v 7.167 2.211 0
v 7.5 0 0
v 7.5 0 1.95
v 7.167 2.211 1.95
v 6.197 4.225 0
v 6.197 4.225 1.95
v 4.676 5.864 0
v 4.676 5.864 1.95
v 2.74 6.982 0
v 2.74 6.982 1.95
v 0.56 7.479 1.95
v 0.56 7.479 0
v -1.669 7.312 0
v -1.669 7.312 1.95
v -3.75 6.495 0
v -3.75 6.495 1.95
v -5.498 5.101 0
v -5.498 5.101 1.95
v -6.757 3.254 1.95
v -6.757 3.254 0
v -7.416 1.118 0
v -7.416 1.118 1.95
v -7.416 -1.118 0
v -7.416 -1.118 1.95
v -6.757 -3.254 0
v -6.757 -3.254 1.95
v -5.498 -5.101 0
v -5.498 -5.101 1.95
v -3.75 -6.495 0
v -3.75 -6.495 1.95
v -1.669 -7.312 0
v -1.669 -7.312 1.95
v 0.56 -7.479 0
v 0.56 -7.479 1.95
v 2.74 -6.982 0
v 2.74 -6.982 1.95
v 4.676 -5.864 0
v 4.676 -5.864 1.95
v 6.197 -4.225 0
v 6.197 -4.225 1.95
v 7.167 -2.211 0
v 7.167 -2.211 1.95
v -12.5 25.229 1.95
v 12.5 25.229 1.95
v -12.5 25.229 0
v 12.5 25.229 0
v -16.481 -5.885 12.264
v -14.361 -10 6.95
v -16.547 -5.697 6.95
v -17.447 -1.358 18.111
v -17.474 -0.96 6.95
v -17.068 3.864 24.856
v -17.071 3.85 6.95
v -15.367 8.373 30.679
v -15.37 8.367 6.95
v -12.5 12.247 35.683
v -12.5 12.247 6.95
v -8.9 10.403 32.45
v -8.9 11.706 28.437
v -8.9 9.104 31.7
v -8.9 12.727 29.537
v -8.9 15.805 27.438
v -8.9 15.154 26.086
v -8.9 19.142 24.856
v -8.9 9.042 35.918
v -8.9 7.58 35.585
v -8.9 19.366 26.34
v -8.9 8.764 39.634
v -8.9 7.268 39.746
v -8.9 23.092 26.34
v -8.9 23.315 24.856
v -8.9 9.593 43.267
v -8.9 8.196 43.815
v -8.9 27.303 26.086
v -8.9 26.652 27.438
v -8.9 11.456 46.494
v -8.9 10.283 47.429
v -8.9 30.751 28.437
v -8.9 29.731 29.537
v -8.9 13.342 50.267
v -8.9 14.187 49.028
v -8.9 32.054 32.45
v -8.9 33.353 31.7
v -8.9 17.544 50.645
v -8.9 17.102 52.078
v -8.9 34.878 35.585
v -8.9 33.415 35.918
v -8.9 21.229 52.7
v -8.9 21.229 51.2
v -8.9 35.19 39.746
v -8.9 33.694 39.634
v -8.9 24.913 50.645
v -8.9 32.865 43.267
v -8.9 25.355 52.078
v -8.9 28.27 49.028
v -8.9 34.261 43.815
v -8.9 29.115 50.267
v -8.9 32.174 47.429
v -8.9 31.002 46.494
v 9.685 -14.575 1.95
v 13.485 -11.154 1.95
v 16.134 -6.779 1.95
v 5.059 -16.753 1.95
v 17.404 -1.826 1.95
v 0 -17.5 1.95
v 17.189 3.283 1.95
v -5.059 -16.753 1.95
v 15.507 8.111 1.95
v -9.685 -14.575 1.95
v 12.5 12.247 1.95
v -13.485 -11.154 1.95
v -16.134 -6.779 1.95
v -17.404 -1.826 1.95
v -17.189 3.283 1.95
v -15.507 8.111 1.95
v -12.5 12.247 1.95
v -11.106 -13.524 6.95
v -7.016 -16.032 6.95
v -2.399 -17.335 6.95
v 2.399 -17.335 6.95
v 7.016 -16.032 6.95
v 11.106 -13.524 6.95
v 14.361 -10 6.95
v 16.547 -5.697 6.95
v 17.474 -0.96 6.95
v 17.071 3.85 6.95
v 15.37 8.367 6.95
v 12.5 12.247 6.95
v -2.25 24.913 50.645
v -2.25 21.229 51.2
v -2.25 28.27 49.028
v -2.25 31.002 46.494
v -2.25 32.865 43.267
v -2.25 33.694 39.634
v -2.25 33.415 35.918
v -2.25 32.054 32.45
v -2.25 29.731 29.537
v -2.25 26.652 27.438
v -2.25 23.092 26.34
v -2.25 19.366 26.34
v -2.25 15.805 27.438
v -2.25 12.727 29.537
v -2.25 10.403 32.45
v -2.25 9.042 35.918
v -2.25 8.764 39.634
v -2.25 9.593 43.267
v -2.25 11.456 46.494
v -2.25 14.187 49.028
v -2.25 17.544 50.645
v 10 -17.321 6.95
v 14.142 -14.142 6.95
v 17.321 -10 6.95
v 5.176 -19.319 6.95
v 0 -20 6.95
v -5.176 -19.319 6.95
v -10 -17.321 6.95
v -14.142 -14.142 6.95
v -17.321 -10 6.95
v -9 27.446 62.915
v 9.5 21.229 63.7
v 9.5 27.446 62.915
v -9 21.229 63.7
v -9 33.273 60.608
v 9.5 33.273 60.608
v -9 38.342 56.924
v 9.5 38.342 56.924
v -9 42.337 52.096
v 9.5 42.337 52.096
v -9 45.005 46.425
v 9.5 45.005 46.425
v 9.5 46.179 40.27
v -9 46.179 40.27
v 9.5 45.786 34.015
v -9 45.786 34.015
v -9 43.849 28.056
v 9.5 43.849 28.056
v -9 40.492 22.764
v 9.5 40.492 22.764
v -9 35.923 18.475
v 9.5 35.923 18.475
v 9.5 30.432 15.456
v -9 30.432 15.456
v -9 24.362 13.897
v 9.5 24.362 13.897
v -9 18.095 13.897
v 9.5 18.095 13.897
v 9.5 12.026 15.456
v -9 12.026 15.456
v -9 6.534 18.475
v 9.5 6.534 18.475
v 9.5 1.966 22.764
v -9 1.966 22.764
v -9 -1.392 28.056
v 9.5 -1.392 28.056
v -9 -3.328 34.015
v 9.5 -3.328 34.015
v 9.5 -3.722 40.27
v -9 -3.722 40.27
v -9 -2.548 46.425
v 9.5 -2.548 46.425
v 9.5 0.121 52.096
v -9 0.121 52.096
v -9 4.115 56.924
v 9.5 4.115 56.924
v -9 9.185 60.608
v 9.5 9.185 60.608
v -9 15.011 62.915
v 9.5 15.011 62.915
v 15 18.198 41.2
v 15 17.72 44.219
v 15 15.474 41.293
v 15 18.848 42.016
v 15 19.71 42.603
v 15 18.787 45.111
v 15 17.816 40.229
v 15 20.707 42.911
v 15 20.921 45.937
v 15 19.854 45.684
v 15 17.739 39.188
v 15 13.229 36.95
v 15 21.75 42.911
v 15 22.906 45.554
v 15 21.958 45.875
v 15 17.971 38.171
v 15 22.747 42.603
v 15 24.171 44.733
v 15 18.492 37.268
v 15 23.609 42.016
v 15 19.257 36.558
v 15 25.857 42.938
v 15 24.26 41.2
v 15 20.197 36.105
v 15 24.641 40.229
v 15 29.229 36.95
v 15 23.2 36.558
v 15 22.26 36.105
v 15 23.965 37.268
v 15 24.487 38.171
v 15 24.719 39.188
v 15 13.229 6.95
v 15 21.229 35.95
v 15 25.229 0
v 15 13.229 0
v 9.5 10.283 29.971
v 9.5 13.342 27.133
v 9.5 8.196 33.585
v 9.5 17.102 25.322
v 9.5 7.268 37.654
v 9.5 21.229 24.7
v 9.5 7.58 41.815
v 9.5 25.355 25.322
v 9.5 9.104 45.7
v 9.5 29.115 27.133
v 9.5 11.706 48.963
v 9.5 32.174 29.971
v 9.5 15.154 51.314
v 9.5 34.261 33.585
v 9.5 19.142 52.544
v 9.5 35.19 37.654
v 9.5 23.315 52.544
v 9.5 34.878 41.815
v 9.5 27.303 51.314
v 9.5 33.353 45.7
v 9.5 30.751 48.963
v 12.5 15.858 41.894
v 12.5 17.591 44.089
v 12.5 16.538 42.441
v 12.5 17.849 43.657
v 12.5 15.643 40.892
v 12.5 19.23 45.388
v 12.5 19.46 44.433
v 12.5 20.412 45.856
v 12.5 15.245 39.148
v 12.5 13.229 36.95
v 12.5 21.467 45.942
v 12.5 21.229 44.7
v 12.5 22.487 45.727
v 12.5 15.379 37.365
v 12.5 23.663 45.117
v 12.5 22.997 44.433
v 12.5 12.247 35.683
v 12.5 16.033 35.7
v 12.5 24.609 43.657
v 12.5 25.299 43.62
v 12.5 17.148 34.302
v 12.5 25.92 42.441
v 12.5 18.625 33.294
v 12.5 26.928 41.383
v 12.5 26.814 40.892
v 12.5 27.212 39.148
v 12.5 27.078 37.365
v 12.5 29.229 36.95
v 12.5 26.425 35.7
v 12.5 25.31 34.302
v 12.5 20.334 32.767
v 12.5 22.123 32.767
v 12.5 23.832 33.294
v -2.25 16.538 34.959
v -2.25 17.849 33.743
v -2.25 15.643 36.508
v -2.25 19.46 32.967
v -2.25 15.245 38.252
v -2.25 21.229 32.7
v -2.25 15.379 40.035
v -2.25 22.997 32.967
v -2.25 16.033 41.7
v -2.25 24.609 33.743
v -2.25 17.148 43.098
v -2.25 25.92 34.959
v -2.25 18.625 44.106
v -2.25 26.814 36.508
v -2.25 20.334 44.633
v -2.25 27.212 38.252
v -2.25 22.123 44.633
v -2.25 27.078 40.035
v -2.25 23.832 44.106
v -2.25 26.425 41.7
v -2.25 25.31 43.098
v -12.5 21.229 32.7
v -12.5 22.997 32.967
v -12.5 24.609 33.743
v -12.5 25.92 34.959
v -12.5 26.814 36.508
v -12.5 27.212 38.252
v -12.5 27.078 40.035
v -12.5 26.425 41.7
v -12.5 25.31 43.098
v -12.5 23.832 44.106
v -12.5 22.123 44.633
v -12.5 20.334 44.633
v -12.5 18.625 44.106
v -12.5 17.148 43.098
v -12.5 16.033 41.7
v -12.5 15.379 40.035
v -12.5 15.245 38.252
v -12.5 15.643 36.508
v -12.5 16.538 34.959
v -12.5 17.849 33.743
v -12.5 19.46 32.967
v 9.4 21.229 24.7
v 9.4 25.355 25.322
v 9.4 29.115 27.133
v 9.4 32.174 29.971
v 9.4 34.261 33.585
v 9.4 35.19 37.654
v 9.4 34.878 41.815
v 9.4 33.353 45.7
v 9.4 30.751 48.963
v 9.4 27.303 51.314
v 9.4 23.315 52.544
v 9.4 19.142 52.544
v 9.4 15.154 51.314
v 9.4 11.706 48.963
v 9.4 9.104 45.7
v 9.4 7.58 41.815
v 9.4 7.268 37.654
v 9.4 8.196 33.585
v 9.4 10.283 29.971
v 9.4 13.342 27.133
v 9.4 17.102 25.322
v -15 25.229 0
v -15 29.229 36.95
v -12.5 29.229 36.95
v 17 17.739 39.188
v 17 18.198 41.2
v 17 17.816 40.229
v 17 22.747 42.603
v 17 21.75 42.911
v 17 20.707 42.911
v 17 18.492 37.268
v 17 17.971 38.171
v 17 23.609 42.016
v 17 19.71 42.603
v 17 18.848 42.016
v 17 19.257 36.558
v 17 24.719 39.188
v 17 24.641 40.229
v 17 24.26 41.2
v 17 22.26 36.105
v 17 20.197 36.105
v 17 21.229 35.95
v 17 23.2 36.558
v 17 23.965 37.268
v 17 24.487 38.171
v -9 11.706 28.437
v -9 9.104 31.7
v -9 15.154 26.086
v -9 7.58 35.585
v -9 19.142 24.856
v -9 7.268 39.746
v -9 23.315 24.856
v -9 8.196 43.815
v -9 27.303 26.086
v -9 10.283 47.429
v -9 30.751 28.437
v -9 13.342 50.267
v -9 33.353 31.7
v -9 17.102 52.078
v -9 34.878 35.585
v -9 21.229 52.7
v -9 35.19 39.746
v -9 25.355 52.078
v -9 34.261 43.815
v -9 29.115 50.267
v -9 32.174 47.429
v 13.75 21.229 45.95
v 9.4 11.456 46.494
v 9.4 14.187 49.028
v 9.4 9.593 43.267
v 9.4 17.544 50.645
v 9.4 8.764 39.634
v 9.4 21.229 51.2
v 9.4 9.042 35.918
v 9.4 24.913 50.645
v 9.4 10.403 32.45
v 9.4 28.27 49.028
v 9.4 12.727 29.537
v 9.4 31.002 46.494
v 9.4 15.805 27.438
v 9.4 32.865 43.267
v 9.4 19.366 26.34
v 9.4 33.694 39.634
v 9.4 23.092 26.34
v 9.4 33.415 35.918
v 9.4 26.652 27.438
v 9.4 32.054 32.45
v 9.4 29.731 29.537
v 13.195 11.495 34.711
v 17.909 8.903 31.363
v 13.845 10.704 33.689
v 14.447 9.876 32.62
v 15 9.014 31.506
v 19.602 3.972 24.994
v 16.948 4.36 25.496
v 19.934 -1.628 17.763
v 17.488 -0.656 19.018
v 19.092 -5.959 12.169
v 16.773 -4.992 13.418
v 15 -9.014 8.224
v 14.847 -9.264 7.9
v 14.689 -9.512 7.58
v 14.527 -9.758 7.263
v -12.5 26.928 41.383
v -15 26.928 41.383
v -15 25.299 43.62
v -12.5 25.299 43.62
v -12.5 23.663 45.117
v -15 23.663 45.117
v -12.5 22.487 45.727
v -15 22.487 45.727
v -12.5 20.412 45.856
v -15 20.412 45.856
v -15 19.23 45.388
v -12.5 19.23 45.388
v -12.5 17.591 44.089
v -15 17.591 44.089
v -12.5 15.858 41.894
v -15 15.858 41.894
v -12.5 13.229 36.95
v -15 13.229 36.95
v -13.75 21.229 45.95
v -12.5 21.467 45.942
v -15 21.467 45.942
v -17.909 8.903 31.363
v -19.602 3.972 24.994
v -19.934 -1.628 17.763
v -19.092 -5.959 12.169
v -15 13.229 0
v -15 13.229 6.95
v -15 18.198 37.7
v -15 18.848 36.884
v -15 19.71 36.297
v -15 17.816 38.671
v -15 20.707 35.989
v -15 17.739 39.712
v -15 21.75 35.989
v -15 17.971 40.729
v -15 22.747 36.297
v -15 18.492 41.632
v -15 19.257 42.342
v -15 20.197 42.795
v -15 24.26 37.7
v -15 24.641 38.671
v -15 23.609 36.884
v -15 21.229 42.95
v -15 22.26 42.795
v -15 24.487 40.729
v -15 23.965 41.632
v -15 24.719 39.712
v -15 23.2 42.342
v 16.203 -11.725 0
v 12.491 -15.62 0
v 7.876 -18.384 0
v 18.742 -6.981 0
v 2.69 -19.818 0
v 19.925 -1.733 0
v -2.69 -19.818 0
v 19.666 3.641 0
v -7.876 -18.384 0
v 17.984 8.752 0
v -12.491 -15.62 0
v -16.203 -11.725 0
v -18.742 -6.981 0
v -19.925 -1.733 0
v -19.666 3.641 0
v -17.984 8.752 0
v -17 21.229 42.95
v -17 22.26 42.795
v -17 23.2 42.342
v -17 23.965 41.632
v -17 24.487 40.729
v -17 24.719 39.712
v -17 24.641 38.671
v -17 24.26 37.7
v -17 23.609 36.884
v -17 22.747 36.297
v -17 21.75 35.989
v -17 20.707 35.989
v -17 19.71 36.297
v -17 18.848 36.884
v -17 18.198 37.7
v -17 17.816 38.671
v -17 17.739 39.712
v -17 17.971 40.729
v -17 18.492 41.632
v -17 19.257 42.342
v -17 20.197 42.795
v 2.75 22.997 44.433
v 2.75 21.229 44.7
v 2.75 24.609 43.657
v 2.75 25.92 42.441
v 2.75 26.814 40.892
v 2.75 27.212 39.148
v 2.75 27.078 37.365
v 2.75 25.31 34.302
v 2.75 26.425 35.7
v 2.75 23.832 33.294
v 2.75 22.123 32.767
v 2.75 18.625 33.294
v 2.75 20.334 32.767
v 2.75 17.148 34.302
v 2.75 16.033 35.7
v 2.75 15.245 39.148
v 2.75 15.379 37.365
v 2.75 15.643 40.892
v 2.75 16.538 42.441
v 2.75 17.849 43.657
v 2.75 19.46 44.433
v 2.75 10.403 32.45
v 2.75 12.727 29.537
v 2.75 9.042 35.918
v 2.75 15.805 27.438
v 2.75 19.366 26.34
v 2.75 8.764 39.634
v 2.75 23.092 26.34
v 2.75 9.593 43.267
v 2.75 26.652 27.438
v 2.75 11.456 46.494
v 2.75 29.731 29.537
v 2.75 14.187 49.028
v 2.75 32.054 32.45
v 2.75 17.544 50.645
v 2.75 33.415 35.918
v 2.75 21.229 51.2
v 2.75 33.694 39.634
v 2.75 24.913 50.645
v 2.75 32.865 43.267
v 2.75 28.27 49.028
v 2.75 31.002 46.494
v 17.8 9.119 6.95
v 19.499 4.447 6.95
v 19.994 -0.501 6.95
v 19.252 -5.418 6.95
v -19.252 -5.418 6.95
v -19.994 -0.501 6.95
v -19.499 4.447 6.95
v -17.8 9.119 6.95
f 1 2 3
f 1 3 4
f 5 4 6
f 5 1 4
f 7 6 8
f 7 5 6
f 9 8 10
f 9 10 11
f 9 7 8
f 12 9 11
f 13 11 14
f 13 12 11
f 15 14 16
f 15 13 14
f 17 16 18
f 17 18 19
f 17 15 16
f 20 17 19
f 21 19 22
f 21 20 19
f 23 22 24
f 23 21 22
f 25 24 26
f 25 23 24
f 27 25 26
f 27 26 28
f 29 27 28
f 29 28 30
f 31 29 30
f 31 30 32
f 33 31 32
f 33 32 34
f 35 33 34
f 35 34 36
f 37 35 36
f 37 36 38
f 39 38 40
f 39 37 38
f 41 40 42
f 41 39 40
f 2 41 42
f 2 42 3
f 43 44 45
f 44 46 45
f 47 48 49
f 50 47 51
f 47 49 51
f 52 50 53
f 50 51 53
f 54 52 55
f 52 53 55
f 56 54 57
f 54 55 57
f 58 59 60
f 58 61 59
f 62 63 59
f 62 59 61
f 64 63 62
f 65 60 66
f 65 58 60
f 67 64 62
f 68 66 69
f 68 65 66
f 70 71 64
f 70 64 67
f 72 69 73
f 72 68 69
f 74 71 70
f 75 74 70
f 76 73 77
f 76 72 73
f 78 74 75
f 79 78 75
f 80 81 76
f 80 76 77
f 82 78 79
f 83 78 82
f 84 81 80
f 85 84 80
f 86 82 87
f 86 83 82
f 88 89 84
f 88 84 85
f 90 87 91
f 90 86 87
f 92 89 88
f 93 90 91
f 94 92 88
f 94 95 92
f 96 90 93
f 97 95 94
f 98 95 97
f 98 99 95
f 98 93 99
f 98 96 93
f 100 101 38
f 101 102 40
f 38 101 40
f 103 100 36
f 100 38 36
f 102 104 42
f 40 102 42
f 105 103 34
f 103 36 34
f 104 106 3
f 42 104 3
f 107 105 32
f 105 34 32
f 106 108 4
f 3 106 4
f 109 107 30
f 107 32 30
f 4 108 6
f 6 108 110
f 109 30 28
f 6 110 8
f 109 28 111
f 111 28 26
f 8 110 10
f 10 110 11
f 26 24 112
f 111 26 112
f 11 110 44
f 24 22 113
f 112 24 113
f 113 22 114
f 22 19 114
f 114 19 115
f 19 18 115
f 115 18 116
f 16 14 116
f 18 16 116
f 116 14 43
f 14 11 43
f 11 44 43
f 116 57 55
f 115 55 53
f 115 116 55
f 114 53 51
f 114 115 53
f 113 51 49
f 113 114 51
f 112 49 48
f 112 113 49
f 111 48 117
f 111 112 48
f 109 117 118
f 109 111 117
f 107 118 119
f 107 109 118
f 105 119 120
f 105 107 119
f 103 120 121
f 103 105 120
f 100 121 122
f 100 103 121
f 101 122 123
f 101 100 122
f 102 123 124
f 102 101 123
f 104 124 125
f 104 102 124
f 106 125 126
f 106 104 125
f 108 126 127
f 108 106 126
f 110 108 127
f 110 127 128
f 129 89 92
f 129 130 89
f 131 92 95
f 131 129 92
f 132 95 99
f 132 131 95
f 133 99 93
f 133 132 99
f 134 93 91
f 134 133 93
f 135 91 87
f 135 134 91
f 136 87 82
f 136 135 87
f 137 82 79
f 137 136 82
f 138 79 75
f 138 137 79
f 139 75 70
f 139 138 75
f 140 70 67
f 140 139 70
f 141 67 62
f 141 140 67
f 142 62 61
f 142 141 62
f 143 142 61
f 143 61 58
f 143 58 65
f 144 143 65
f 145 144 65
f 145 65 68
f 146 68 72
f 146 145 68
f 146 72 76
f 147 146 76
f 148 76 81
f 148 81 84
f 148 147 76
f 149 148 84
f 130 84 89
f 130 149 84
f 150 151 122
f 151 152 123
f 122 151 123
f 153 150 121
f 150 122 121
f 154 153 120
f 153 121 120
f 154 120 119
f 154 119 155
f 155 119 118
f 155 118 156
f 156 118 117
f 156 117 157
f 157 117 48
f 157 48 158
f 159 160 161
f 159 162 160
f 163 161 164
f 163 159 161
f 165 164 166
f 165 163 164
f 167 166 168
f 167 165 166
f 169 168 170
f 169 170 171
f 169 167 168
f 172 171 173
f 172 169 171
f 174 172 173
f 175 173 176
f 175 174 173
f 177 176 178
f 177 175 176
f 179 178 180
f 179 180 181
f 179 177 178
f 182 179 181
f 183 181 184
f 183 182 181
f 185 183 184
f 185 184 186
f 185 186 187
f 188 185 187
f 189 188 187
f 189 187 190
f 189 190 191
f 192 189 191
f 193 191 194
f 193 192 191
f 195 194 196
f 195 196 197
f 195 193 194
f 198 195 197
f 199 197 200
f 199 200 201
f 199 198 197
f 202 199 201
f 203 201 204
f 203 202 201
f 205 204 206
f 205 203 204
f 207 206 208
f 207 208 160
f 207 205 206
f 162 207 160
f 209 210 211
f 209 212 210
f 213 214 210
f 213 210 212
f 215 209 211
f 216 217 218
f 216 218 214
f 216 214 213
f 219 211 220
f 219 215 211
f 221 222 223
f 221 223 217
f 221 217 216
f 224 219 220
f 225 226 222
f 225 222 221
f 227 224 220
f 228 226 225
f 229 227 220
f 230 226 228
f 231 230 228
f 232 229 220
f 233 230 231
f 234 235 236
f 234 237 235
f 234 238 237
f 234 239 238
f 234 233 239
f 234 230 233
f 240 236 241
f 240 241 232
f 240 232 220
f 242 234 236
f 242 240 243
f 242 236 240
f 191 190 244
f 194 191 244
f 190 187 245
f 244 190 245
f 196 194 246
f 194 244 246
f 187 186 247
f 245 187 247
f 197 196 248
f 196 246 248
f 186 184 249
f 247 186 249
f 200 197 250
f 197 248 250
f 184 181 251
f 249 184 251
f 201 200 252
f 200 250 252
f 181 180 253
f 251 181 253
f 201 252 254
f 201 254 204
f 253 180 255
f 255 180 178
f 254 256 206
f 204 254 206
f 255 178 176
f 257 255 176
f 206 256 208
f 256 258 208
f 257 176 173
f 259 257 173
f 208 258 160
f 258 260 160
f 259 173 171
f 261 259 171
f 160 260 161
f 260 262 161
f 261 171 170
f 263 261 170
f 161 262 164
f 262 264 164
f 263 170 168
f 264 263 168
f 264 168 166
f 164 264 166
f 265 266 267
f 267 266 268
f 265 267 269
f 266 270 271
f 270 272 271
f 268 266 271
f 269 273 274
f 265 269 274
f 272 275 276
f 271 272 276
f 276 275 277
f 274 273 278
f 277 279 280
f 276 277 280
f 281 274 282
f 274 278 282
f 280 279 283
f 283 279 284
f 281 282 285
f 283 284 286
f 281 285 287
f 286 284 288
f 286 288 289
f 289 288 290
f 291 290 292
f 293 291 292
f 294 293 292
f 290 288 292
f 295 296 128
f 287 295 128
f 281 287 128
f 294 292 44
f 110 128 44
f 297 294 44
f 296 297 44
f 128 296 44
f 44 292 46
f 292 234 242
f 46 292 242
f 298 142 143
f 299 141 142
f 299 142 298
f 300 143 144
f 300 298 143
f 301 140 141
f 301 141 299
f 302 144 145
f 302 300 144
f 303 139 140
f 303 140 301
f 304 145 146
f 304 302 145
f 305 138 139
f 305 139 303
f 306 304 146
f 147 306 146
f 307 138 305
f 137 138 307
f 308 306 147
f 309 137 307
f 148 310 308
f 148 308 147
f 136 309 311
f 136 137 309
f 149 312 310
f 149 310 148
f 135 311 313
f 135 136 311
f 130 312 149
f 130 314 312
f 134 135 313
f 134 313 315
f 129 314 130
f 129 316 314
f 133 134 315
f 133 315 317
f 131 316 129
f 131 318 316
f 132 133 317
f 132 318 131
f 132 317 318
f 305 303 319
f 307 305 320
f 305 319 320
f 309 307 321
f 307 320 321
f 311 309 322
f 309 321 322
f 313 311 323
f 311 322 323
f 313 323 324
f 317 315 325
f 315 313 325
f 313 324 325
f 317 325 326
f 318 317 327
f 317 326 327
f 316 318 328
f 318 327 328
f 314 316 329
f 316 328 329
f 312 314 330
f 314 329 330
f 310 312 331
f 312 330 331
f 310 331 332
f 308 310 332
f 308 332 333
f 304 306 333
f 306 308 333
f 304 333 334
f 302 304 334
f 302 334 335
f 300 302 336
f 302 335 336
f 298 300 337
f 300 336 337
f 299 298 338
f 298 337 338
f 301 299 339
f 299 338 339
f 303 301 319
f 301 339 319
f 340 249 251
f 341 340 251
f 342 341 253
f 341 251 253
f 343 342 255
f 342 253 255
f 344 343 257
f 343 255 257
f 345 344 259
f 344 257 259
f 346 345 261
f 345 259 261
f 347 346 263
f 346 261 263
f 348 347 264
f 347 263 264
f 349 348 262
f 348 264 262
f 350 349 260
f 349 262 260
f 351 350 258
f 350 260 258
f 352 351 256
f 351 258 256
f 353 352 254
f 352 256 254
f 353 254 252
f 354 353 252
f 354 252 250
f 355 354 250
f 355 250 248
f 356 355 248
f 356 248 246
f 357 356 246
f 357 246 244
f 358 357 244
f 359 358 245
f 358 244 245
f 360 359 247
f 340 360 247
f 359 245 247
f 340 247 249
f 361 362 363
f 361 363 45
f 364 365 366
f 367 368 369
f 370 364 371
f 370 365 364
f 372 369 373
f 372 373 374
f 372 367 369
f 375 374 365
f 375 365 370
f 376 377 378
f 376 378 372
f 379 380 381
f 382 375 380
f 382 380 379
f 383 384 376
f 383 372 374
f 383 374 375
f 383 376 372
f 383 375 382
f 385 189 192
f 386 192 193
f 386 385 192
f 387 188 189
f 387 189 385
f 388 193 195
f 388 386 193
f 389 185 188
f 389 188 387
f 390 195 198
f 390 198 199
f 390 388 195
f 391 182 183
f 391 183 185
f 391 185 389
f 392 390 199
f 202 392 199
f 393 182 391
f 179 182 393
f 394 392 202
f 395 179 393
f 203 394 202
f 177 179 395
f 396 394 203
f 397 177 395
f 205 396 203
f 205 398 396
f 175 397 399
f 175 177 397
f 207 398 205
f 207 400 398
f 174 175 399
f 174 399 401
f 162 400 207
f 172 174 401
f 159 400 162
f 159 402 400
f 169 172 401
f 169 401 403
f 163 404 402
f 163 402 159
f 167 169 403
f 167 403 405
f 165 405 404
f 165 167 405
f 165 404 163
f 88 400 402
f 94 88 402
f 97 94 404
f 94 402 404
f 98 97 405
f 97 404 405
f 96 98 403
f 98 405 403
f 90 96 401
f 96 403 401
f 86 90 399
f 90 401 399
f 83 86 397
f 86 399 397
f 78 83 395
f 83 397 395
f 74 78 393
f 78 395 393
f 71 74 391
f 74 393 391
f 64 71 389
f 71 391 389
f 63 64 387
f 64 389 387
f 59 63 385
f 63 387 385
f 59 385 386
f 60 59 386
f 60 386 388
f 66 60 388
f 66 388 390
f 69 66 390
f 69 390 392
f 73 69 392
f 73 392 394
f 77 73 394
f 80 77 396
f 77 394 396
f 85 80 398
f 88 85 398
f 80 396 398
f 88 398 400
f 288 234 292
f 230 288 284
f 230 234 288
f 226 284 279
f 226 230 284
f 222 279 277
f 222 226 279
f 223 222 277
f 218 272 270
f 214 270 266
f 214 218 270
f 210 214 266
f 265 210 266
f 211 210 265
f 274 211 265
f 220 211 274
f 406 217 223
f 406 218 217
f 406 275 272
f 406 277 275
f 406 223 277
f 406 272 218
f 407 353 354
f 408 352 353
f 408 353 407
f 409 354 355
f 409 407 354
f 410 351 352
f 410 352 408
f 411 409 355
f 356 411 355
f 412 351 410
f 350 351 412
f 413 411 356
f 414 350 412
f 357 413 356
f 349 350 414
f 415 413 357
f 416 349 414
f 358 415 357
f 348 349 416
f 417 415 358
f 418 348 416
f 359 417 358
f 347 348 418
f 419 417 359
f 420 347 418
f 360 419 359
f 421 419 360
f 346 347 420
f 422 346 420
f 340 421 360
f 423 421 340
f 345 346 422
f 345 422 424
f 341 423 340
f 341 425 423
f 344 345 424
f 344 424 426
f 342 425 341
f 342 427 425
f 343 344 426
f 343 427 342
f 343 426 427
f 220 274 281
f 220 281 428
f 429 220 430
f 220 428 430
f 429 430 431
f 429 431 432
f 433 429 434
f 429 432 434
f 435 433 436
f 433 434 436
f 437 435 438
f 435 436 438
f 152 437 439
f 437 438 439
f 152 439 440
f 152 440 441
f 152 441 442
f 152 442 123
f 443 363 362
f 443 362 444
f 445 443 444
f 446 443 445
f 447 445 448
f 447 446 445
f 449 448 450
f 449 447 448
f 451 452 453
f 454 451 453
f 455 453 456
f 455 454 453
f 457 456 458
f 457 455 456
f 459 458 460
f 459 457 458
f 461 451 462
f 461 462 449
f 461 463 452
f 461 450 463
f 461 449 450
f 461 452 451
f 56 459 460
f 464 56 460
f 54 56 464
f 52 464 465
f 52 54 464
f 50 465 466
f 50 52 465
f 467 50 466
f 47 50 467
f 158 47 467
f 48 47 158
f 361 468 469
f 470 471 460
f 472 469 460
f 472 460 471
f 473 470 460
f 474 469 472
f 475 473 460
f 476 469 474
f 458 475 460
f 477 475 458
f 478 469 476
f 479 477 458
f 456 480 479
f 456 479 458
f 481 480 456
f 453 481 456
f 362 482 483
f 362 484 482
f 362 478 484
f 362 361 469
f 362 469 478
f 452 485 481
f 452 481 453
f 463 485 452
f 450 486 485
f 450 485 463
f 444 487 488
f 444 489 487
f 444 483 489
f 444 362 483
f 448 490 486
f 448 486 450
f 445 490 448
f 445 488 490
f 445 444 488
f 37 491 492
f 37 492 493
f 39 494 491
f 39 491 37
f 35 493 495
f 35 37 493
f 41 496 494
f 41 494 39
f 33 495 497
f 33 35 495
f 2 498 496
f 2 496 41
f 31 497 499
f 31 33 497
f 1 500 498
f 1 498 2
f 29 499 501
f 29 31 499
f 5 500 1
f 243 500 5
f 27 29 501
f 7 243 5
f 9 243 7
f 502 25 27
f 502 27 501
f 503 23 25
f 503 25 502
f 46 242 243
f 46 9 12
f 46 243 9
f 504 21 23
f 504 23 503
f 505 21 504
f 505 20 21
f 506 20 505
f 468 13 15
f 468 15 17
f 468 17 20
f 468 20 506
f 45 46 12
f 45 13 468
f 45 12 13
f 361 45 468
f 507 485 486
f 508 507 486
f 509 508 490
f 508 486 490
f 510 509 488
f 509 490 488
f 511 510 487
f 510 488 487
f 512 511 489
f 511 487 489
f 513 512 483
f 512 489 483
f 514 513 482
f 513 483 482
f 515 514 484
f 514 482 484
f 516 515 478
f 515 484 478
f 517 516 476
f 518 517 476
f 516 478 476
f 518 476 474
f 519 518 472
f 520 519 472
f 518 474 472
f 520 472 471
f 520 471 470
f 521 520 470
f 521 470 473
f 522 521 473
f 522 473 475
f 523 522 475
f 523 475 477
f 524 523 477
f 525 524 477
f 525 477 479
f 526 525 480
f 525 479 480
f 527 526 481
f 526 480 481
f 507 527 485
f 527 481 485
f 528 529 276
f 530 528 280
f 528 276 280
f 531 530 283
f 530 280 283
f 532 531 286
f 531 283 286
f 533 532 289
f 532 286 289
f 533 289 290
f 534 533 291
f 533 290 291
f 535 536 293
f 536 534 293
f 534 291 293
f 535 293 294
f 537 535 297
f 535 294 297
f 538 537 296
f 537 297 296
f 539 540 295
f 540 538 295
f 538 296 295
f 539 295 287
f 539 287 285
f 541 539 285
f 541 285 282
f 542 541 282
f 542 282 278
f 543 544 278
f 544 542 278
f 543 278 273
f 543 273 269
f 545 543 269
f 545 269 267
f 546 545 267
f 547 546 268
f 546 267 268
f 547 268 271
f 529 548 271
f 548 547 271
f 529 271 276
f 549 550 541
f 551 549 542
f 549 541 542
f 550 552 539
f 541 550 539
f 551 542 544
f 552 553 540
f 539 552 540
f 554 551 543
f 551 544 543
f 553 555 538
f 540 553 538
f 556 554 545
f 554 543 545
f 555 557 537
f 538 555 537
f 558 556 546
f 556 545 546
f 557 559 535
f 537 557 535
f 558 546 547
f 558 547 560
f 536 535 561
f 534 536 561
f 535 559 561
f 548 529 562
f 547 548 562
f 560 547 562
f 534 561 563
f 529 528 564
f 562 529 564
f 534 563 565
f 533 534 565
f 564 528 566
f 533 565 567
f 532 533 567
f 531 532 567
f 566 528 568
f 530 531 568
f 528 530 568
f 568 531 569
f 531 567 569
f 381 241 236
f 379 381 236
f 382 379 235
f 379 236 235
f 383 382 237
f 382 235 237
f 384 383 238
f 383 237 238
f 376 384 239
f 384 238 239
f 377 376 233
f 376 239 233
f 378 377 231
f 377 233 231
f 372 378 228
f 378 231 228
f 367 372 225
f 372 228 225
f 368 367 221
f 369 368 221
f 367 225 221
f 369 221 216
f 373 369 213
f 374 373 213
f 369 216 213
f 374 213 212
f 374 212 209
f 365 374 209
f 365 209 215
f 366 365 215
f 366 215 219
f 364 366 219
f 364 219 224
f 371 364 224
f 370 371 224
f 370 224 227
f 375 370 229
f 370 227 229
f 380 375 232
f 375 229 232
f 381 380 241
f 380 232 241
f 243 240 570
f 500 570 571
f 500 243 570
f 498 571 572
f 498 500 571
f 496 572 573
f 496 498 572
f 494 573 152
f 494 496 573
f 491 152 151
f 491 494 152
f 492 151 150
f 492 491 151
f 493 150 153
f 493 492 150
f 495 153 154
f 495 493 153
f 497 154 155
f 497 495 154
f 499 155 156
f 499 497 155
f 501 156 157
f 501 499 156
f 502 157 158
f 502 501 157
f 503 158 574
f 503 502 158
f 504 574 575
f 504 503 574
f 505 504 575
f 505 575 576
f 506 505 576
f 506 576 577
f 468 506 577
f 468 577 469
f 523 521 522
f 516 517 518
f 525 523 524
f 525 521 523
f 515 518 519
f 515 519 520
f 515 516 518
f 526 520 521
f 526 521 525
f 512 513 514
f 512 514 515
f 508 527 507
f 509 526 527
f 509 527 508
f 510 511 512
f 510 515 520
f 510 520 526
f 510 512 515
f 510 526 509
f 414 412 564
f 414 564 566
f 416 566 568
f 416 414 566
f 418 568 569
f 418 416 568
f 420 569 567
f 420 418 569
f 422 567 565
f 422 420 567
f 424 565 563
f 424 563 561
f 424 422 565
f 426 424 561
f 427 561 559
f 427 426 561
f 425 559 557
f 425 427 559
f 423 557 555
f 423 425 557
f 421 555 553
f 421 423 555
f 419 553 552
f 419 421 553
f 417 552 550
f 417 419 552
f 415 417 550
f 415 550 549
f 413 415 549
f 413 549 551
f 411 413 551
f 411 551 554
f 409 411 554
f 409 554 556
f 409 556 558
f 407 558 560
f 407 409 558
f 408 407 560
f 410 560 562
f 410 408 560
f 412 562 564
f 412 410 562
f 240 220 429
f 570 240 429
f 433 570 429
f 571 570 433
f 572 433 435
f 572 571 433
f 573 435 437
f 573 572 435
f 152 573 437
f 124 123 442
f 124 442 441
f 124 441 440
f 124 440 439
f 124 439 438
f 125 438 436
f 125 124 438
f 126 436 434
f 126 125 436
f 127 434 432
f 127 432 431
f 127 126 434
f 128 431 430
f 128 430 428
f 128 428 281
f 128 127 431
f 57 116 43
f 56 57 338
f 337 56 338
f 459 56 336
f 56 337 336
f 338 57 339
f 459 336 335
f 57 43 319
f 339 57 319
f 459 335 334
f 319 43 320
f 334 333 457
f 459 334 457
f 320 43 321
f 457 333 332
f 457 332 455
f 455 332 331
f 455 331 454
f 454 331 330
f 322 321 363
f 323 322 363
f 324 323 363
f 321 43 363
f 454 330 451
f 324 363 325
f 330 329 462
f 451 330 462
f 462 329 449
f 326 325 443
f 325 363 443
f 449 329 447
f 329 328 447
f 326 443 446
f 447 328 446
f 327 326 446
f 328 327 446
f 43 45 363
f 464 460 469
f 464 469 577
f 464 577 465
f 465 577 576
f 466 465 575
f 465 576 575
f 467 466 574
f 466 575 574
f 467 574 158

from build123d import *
from build123d.topology import SkipClean

# Parameters (mm, degrees)
SKETCH1_R               = 7.5
BOSS_EXTRUDE1_DEPTH     = 1.95
BOSS_EXTRUDE2_DEPTH     = 5
BOSS_EXTRUDE3_DEPTH     = 40
BOSS_EXTRUDE5_DEPTH     = 2.5
SKETCH20_W              = 10
SKETCH20_H              = 3.999999996
BOSS_EXTRUDE6_DEPTH     = 2.5
BOSS_EXTRUDE7_DEPTH     = 2.5
CUT_EXTRUDE8_DEPTH      = 42.5
CUT_EXTRUDE9_DEPTH      = 42.5
CUT_EXTRUDE9_DEPTH_BACK = 42.5
SKETCH25_R              = 3.5
BOSS_EXTRUDE8_DEPTH     = 2
BOSS_EXTRUDE9_START     = 2
SKETCH26_R              = 3.5
BOSS_EXTRUDE9_DEPTH     = 2
SKETCH27_R              = 6
BOSS_EXTRUDE10_DEPTH    = 12.25
SKETCH33_R              = 25
SKETCH33_R_2            = 12.5
BOSS_EXTRUDE11_DEPTH    = 9.25
SKETCH40_R              = 12.5
BOSS_EXTRUDE13_DEPTH    = 2.5
BOSS_EXTRUDE12_REACH    = 87.153
SKETCH34_R              = 6
CUT_EXTRUDE10_START     = -0.1
SKETCH47_R              = 14
SKETCH47_R_2            = 12.5
CUT_EXTRUDE10_DEPTH     = 0.1
SKETCH48_R              = 14
SKETCH48_R_2            = 12.5
CUT_EXTRUDE13_DEPTH     = 0.1


with BuildPart() as part:
    # Sketch1 → Boss-Extrude1 (new body)
    with BuildSketch(Plane.XY):
        with BuildLine():
            Line((-15.00003653, 25.228715134), (15.00003653, 25.228715134))
            Line((15.00003653, 25.228715134), (15.00003653, 13.228715134))
            ThreePointArc((15.00003653, 13.228715134), (0, -20), (-15.00003653, 13.228715134))
            Line((-15.00003653, 13.228715134), (-15.00003653, 25.228715134))
        make_face()
        Circle(SKETCH1_R, mode=Mode.SUBTRACT)
    extrude(amount=BOSS_EXTRUDE1_DEPTH)

    # Sketch4 → Boss-Extrude2 (add)
    with BuildSketch(Plane.XY.offset(1.95)):
        with BuildLine():
            Line((-12.50003653, 25.228715134), (-12.50003653, 12.247411431))
            ThreePointArc((-12.50003653, 12.247411431), (0, -17.5), (12.50003653, 12.247411431))
            Line((12.50003653, 12.247411431), (12.50003653, 25.228715134))
            Line((12.50003653, 25.228715134), (15.00003653, 25.228715134))
            Line((15.00003653, 25.228715134), (15.00003653, 13.228715134))
            ThreePointArc((15.00003653, 13.228715134), (0, -20), (-15.00003653, 13.228715134))
            Line((-15.00003653, 13.228715134), (-15.00003653, 25.228715134))
            Line((-15.00003653, 25.228715134), (-12.50003653, 25.228715134))
        make_face()
    extrude(amount=BOSS_EXTRUDE2_DEPTH)

    # Sketch7 → Boss-Extrude3 (add)
    with SkipClean():  # the faces are left unmerged after this step: merging them gives an invalid solid
        with BuildSketch(Plane.XY.offset(6.95)):
            with BuildLine():
                Line((-17.320505157, -10.000005055), (-14.361403097, -10.000005055))
                ThreePointArc((-14.361403097, -10.000005055), (-17.439068776, 1.459068274), (-12.50003653, 12.247411431))
                Line((-12.50003653, 12.247411431), (-12.50003653, 15.612465749))
                Line((-12.50003653, 15.612465749), (-12.50003653, 25.228715134))
                Line((-12.50003653, 25.228715134), (-15.00003653, 25.228715134))
                Line((-15.00003653, 25.228715134), (-15.00003653, 13.228715134))
                ThreePointArc((-15.00003653, 13.228715134), (-19.900947569, 1.988035678), (-17.320505157, -10.000005055))
            make_face()
            with BuildLine():
                Line((17.320505157, -10.000005055), (14.361403097, -10.000005055))
                ThreePointArc((14.361403097, -10.000005055), (17.439068776, 1.459068274), (12.50003653, 12.247411431))
                Line((12.50003653, 12.247411431), (12.50003653, 15.612465749))
                Line((12.50003653, 15.612465749), (12.50003653, 25.228715134))
                Line((12.50003653, 25.228715134), (15.00003653, 25.228715134))
                Line((15.00003653, 25.228715134), (15.00003653, 13.228715134))
                ThreePointArc((15.00003653, 13.228715134), (19.900947569, 1.988035678), (17.320505157, -10.000005055))
            make_face()
        extrude(amount=BOSS_EXTRUDE3_DEPTH)

    # Sketch19 → Boss-Extrude5 (add)
    with SkipClean():  # the faces are left unmerged after this step: merging them gives an invalid solid
        with BuildSketch(Plane(origin=(15.00003653, 0, 0), x_dir=(0, 0, -1), z_dir=(1, 0, 0))):
            Polygon((-36.95, 29.22871513), (0, 25.228715134), (-36.95, 25.228715134), align=None)
        extrude(amount=-BOSS_EXTRUDE5_DEPTH)

    # Sketch20 → Boss-Extrude6 (add)
    with SkipClean():  # the faces are left unmerged after this step: merging them gives an invalid solid
        with BuildSketch(Plane(origin=(15.00003653, 0, 0), x_dir=(0, 0, -1), z_dir=(1, 0, 0))):
            with Locations((-41.95, 27.228715132)):
                Rectangle(SKETCH20_W, SKETCH20_H)
        extrude(amount=-BOSS_EXTRUDE6_DEPTH)

    # Sketch22 → Boss-Extrude7 (add)
    with SkipClean():  # the faces are left unmerged after this step: merging them gives an invalid solid
        with BuildSketch(Plane.ZY.offset(15.00003653)):
            Polygon((46.95, 25.228715134), (46.95, 29.22871513), (36.95, 29.22871513), (0, 25.228715134), align=None)
        extrude(amount=-BOSS_EXTRUDE7_DEPTH)

    # Sketch10 → Cut-Extrude8 (cut)
    with SkipClean():  # the faces are left unmerged after this step: merging them gives an invalid solid
        with BuildSketch(Plane(origin=(15.00003653, 0, 0), x_dir=(0, 0, -1), z_dir=(1, 0, 0))):
            with BuildLine():
                Line((-46.95, 25.228715134), (-46.95, 29.22871513))
                Line((-46.95, 29.22871513), (-36.95, 29.22871513))
                add(Edge.make_bspline(
                    [(-36.95, 29.22871513), (-54.95, 21.22871513), (-36.95, 13.228715134)],
                    knots=[0, 0, 0, 1, 1, 1], degree=2))
                Line((-36.95, 13.228715134), (-46.95, 13.228715134))
                Line((-46.95, 13.228715134), (-46.95, 25.228715134))
            make_face()
        extrude(amount=-CUT_EXTRUDE8_DEPTH, mode=Mode.SUBTRACT)

    # Sketch24 → Cut-Extrude9 (cut, two sides: drawn at the far end of the back side and taken through both)
    with SkipClean():  # the faces are left unmerged after this step: merging them gives an invalid solid
        with BuildSketch(Plane(origin=(15.00003653, 0, 0), x_dir=(0, 0, -1), z_dir=(1, 0, 0)).offset(-CUT_EXTRUDE9_DEPTH_BACK)):
            Polygon((-36.95, 13.228715134), (-6.95, -10.000005055), (-46.95, -10.000005055), (-46.95, 13.228715134), align=None)
        extrude(amount=CUT_EXTRUDE9_DEPTH + CUT_EXTRUDE9_DEPTH_BACK, mode=Mode.SUBTRACT)

    # Sketch25 → Boss-Extrude8 (add)
    with SkipClean():  # the faces are left unmerged after this step: merging them gives an invalid solid
        with BuildSketch(Plane.ZY.offset(15.00003653)):
            with Locations((39.45, 21.22871513)):
                Circle(SKETCH25_R)
        extrude(amount=BOSS_EXTRUDE8_DEPTH)

    # Sketch26 → Boss-Extrude9 (add)
    with SkipClean():  # the faces are left unmerged after this step: merging them gives an invalid solid
        with BuildSketch(Plane(origin=(15.00003653, 0, 0), x_dir=(0, 0, -1), z_dir=(1, 0, 0)).offset(BOSS_EXTRUDE9_START)):
            with Locations((-39.45, 21.22871513)):
                Circle(SKETCH26_R)
        extrude(amount=-BOSS_EXTRUDE9_DEPTH)

    # Sketch27 → Boss-Extrude10 (add)
    with SkipClean():  # the faces are left unmerged after this step: merging them gives an invalid solid
        with BuildSketch(Plane.ZY.offset(-12.50003653)):
            with Locations((38.7, 21.22871513)):
                Circle(SKETCH27_R)
        extrude(amount=BOSS_EXTRUDE10_DEPTH)



with BuildPart() as body_2:
    # Sketch33 → Boss-Extrude11 (new, symmetric)
    with BuildSketch(Plane.ZY.offset(-0.25003653)):
        with Locations((38.7, 21.22871513)):
            Circle(SKETCH33_R)
        with Locations((38.7, 21.22871513)):
            Circle(SKETCH33_R_2, mode=Mode.SUBTRACT)
    extrude(amount=BOSS_EXTRUDE11_DEPTH, both=True)


with BuildPart() as part_1:
    with SkipClean():  # the faces are left unmerged after this step: merging them gives an invalid solid
        add(part.part)

        add(body_2.part)  # Boss-Extrude13 merges body 2
        # Sketch40 → Boss-Extrude13 (add, symmetric)
        with BuildSketch(Plane.ZY.offset(-0.25003653)):
            with Locations((38.7, 21.22871513)):
                Circle(SKETCH40_R)
        extrude(amount=BOSS_EXTRUDE13_DEPTH, both=True)

    # Sketch34 → Boss-Extrude12 (add, up to next)
    with BuildSketch(Plane(origin=(-12.50003653, 0, 0), x_dir=(0, 0, -1), z_dir=(1, 0, 0)), mode=Mode.PRIVATE) as boss_extrude12_sk1:
        with Locations((-38.7, 21.22871513)):
            Circle(SKETCH34_R)
    boss_extrude12_tool1 = extrude(boss_extrude12_sk1.sketch, amount=BOSS_EXTRUDE12_REACH, mode=Mode.PRIVATE) - part_1.part
    add(boss_extrude12_tool1.solids().sort_by_distance((-12.500037, 21.228715, 38.7))[0])

    # Sketch47 → Cut-Extrude10 (cut)
    with SkipClean():  # the faces are left unmerged after this step: merging them gives an invalid solid
        with BuildSketch(Plane.ZY.offset(8.99996347).offset(CUT_EXTRUDE10_START)):
            with Locations((38.7, 21.22871513)):
                Circle(SKETCH47_R)
            with Locations((38.7, 21.22871513)):
                Circle(SKETCH47_R_2, mode=Mode.SUBTRACT)
        extrude(amount=CUT_EXTRUDE10_DEPTH, mode=Mode.SUBTRACT)

    # Sketch48 → Cut-Extrude13 (cut)
    with SkipClean():  # the faces are left unmerged after this step: merging them gives an invalid solid
        with BuildSketch(Plane(origin=(9.50003653, 0, 0), x_dir=(0, 0, -1), z_dir=(1, 0, 0))):
            with Locations((-38.7, 21.22871513)):
                Circle(SKETCH48_R)
            with Locations((-38.7, 21.22871513)):
                Circle(SKETCH48_R_2, mode=Mode.SUBTRACT)
        extrude(amount=-CUT_EXTRUDE13_DEPTH, mode=Mode.SUBTRACT)


solid = part_1.part
